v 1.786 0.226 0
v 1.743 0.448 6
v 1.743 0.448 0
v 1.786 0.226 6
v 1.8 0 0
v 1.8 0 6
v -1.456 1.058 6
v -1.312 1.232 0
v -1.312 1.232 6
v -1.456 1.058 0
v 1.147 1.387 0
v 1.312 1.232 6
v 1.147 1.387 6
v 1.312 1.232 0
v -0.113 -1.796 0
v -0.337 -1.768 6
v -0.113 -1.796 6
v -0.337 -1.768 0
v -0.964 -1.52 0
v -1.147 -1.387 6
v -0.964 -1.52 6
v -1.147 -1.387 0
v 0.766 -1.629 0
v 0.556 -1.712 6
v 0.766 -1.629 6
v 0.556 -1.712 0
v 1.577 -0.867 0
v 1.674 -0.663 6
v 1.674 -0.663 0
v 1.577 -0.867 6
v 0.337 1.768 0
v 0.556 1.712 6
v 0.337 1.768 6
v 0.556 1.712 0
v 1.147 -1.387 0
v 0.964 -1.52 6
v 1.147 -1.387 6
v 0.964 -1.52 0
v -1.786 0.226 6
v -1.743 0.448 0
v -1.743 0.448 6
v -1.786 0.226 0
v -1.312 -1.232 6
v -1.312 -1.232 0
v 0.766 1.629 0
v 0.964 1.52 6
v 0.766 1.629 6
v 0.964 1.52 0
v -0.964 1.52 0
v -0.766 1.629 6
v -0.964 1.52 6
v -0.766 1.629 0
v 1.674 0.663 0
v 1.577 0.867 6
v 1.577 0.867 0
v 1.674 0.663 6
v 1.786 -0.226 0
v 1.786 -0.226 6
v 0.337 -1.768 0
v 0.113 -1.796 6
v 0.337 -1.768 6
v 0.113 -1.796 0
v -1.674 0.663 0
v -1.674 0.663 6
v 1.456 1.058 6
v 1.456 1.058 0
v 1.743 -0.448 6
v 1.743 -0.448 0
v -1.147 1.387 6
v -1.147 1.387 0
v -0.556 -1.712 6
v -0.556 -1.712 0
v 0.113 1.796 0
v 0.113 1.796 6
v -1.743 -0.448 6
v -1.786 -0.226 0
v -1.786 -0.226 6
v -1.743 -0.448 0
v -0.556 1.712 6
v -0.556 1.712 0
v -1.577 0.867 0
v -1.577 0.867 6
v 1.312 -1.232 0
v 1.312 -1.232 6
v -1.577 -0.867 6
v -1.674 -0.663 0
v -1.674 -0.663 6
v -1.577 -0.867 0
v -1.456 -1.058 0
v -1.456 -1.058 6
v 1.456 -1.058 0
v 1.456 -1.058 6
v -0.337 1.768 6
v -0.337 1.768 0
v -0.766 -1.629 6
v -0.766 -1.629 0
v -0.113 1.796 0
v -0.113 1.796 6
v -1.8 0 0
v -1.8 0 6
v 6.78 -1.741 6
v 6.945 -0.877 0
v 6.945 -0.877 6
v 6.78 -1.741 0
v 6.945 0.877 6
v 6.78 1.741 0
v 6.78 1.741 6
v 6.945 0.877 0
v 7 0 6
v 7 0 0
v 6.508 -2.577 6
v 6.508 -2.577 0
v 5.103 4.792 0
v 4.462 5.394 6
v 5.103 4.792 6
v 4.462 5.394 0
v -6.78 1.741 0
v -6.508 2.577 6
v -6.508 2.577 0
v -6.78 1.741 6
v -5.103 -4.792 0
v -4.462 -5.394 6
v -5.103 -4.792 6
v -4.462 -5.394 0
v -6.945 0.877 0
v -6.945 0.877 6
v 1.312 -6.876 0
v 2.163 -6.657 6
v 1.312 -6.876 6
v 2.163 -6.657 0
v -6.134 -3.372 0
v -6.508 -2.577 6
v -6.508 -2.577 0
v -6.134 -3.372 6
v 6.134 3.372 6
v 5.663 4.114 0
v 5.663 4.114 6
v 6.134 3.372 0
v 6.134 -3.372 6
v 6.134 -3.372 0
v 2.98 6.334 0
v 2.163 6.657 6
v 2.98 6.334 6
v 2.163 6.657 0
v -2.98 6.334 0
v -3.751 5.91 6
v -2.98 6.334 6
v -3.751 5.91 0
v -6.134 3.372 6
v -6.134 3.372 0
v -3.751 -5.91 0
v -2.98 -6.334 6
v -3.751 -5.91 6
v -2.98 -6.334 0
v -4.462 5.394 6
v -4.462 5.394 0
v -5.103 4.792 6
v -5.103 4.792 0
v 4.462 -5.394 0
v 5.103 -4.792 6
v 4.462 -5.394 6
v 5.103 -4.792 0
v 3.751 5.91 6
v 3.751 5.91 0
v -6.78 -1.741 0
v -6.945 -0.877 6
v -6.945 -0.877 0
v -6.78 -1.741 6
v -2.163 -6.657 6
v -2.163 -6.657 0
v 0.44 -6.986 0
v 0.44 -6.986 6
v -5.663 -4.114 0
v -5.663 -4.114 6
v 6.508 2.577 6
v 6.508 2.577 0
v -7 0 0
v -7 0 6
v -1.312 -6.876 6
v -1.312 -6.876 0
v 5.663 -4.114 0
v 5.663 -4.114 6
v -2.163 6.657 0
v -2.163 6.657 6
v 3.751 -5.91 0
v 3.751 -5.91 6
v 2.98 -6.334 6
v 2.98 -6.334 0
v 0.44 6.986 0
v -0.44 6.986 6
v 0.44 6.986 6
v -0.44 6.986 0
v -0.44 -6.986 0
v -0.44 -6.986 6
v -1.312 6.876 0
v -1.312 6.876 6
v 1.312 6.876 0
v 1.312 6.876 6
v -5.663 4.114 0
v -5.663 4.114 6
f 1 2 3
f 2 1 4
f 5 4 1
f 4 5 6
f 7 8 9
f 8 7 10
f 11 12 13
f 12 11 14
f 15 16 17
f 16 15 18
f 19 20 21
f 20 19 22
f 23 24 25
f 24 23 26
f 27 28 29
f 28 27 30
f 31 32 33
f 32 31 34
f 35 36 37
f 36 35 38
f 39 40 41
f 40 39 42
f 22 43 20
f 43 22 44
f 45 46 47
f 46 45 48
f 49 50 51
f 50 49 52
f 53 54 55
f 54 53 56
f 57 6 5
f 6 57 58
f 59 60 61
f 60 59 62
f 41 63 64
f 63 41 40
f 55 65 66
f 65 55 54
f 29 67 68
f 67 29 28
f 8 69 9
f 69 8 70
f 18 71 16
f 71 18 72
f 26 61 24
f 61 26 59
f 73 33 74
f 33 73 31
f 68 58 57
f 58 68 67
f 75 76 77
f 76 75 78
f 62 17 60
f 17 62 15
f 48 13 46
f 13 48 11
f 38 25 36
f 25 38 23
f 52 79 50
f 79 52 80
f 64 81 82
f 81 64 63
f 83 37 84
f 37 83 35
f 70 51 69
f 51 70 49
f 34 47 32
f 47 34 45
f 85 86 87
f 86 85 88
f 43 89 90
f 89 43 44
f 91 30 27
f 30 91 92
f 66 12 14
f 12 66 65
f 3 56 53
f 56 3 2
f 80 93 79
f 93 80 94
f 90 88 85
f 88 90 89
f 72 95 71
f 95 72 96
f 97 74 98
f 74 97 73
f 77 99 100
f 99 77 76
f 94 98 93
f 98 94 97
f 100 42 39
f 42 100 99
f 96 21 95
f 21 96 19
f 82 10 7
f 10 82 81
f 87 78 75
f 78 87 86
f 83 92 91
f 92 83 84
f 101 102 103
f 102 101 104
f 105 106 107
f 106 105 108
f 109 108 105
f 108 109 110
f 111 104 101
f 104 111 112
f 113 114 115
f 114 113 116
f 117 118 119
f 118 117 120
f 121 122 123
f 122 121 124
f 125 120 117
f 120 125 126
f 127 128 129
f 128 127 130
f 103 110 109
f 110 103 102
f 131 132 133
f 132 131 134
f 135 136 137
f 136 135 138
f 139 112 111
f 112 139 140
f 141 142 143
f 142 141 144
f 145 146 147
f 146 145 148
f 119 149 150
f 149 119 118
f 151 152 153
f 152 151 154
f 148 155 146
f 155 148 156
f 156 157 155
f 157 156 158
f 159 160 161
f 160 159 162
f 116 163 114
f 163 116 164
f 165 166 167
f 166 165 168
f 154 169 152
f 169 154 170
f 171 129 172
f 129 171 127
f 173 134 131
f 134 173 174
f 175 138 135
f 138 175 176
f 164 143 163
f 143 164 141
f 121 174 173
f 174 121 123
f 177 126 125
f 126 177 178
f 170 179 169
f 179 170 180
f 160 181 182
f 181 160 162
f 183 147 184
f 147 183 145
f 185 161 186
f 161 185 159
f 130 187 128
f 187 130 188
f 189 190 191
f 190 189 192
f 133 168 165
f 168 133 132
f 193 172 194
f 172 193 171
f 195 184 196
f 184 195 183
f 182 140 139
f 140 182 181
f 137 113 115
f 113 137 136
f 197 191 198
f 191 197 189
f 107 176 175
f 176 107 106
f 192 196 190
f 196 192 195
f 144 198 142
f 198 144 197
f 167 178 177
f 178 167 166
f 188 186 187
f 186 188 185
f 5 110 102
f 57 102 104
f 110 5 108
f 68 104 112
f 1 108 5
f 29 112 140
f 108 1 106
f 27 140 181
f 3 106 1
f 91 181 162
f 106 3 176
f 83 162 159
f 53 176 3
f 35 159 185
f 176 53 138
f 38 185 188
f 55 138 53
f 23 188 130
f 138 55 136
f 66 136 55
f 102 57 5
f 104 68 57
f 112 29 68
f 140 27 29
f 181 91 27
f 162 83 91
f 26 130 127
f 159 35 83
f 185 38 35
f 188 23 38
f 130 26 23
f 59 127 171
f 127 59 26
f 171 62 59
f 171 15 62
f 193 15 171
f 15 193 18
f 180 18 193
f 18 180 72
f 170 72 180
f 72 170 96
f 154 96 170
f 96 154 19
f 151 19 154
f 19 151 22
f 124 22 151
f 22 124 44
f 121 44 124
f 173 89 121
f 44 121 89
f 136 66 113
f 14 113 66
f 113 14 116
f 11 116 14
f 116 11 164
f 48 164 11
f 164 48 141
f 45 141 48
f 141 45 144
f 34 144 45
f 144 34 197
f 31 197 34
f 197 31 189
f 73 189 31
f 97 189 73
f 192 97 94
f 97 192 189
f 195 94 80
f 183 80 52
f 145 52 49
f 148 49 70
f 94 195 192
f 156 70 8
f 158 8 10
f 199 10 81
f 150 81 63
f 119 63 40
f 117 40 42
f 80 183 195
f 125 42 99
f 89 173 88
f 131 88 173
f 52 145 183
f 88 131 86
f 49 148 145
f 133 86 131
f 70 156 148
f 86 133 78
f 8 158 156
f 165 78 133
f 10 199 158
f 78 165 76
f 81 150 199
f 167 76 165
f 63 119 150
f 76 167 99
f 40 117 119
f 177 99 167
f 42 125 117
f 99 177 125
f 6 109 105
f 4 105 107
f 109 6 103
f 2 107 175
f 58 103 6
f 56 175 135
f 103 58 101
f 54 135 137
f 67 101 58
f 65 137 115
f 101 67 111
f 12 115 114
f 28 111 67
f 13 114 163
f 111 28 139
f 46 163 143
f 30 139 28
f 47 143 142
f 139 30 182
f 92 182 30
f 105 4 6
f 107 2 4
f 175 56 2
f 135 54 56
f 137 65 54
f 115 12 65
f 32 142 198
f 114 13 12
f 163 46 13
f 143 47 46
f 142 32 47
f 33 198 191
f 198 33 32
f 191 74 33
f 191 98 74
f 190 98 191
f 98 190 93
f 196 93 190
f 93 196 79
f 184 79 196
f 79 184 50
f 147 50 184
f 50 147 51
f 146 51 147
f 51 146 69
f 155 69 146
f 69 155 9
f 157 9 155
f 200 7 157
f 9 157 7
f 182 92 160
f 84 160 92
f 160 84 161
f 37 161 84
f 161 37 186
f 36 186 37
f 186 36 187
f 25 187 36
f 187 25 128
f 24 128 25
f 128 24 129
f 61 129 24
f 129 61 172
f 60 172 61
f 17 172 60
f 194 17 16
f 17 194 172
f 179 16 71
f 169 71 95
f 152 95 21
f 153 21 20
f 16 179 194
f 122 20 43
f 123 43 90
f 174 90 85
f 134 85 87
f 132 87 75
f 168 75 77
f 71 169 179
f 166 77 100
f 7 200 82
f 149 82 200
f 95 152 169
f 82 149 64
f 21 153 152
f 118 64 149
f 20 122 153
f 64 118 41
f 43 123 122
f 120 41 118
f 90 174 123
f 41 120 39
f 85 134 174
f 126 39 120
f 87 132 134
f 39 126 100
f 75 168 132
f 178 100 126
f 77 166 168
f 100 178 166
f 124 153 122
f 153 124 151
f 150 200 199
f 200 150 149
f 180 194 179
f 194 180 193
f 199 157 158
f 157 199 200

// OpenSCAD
$fn = 50;


difference() {
	union() {
		cylinder(h = 6, r = 7.0000000000);
	}
	union() {
		translate(v = [0.0000000000, 0.0000000000, -100.0000000000]) {
			cylinder(h = 200, r = 1.8000000000);
		}
		cylinder(h = 6, r = 1.8000000000);
		cylinder(h = 6, r = 1.8000000000);
		cylinder(h = 6, r = 1.8000000000);
	}
}
